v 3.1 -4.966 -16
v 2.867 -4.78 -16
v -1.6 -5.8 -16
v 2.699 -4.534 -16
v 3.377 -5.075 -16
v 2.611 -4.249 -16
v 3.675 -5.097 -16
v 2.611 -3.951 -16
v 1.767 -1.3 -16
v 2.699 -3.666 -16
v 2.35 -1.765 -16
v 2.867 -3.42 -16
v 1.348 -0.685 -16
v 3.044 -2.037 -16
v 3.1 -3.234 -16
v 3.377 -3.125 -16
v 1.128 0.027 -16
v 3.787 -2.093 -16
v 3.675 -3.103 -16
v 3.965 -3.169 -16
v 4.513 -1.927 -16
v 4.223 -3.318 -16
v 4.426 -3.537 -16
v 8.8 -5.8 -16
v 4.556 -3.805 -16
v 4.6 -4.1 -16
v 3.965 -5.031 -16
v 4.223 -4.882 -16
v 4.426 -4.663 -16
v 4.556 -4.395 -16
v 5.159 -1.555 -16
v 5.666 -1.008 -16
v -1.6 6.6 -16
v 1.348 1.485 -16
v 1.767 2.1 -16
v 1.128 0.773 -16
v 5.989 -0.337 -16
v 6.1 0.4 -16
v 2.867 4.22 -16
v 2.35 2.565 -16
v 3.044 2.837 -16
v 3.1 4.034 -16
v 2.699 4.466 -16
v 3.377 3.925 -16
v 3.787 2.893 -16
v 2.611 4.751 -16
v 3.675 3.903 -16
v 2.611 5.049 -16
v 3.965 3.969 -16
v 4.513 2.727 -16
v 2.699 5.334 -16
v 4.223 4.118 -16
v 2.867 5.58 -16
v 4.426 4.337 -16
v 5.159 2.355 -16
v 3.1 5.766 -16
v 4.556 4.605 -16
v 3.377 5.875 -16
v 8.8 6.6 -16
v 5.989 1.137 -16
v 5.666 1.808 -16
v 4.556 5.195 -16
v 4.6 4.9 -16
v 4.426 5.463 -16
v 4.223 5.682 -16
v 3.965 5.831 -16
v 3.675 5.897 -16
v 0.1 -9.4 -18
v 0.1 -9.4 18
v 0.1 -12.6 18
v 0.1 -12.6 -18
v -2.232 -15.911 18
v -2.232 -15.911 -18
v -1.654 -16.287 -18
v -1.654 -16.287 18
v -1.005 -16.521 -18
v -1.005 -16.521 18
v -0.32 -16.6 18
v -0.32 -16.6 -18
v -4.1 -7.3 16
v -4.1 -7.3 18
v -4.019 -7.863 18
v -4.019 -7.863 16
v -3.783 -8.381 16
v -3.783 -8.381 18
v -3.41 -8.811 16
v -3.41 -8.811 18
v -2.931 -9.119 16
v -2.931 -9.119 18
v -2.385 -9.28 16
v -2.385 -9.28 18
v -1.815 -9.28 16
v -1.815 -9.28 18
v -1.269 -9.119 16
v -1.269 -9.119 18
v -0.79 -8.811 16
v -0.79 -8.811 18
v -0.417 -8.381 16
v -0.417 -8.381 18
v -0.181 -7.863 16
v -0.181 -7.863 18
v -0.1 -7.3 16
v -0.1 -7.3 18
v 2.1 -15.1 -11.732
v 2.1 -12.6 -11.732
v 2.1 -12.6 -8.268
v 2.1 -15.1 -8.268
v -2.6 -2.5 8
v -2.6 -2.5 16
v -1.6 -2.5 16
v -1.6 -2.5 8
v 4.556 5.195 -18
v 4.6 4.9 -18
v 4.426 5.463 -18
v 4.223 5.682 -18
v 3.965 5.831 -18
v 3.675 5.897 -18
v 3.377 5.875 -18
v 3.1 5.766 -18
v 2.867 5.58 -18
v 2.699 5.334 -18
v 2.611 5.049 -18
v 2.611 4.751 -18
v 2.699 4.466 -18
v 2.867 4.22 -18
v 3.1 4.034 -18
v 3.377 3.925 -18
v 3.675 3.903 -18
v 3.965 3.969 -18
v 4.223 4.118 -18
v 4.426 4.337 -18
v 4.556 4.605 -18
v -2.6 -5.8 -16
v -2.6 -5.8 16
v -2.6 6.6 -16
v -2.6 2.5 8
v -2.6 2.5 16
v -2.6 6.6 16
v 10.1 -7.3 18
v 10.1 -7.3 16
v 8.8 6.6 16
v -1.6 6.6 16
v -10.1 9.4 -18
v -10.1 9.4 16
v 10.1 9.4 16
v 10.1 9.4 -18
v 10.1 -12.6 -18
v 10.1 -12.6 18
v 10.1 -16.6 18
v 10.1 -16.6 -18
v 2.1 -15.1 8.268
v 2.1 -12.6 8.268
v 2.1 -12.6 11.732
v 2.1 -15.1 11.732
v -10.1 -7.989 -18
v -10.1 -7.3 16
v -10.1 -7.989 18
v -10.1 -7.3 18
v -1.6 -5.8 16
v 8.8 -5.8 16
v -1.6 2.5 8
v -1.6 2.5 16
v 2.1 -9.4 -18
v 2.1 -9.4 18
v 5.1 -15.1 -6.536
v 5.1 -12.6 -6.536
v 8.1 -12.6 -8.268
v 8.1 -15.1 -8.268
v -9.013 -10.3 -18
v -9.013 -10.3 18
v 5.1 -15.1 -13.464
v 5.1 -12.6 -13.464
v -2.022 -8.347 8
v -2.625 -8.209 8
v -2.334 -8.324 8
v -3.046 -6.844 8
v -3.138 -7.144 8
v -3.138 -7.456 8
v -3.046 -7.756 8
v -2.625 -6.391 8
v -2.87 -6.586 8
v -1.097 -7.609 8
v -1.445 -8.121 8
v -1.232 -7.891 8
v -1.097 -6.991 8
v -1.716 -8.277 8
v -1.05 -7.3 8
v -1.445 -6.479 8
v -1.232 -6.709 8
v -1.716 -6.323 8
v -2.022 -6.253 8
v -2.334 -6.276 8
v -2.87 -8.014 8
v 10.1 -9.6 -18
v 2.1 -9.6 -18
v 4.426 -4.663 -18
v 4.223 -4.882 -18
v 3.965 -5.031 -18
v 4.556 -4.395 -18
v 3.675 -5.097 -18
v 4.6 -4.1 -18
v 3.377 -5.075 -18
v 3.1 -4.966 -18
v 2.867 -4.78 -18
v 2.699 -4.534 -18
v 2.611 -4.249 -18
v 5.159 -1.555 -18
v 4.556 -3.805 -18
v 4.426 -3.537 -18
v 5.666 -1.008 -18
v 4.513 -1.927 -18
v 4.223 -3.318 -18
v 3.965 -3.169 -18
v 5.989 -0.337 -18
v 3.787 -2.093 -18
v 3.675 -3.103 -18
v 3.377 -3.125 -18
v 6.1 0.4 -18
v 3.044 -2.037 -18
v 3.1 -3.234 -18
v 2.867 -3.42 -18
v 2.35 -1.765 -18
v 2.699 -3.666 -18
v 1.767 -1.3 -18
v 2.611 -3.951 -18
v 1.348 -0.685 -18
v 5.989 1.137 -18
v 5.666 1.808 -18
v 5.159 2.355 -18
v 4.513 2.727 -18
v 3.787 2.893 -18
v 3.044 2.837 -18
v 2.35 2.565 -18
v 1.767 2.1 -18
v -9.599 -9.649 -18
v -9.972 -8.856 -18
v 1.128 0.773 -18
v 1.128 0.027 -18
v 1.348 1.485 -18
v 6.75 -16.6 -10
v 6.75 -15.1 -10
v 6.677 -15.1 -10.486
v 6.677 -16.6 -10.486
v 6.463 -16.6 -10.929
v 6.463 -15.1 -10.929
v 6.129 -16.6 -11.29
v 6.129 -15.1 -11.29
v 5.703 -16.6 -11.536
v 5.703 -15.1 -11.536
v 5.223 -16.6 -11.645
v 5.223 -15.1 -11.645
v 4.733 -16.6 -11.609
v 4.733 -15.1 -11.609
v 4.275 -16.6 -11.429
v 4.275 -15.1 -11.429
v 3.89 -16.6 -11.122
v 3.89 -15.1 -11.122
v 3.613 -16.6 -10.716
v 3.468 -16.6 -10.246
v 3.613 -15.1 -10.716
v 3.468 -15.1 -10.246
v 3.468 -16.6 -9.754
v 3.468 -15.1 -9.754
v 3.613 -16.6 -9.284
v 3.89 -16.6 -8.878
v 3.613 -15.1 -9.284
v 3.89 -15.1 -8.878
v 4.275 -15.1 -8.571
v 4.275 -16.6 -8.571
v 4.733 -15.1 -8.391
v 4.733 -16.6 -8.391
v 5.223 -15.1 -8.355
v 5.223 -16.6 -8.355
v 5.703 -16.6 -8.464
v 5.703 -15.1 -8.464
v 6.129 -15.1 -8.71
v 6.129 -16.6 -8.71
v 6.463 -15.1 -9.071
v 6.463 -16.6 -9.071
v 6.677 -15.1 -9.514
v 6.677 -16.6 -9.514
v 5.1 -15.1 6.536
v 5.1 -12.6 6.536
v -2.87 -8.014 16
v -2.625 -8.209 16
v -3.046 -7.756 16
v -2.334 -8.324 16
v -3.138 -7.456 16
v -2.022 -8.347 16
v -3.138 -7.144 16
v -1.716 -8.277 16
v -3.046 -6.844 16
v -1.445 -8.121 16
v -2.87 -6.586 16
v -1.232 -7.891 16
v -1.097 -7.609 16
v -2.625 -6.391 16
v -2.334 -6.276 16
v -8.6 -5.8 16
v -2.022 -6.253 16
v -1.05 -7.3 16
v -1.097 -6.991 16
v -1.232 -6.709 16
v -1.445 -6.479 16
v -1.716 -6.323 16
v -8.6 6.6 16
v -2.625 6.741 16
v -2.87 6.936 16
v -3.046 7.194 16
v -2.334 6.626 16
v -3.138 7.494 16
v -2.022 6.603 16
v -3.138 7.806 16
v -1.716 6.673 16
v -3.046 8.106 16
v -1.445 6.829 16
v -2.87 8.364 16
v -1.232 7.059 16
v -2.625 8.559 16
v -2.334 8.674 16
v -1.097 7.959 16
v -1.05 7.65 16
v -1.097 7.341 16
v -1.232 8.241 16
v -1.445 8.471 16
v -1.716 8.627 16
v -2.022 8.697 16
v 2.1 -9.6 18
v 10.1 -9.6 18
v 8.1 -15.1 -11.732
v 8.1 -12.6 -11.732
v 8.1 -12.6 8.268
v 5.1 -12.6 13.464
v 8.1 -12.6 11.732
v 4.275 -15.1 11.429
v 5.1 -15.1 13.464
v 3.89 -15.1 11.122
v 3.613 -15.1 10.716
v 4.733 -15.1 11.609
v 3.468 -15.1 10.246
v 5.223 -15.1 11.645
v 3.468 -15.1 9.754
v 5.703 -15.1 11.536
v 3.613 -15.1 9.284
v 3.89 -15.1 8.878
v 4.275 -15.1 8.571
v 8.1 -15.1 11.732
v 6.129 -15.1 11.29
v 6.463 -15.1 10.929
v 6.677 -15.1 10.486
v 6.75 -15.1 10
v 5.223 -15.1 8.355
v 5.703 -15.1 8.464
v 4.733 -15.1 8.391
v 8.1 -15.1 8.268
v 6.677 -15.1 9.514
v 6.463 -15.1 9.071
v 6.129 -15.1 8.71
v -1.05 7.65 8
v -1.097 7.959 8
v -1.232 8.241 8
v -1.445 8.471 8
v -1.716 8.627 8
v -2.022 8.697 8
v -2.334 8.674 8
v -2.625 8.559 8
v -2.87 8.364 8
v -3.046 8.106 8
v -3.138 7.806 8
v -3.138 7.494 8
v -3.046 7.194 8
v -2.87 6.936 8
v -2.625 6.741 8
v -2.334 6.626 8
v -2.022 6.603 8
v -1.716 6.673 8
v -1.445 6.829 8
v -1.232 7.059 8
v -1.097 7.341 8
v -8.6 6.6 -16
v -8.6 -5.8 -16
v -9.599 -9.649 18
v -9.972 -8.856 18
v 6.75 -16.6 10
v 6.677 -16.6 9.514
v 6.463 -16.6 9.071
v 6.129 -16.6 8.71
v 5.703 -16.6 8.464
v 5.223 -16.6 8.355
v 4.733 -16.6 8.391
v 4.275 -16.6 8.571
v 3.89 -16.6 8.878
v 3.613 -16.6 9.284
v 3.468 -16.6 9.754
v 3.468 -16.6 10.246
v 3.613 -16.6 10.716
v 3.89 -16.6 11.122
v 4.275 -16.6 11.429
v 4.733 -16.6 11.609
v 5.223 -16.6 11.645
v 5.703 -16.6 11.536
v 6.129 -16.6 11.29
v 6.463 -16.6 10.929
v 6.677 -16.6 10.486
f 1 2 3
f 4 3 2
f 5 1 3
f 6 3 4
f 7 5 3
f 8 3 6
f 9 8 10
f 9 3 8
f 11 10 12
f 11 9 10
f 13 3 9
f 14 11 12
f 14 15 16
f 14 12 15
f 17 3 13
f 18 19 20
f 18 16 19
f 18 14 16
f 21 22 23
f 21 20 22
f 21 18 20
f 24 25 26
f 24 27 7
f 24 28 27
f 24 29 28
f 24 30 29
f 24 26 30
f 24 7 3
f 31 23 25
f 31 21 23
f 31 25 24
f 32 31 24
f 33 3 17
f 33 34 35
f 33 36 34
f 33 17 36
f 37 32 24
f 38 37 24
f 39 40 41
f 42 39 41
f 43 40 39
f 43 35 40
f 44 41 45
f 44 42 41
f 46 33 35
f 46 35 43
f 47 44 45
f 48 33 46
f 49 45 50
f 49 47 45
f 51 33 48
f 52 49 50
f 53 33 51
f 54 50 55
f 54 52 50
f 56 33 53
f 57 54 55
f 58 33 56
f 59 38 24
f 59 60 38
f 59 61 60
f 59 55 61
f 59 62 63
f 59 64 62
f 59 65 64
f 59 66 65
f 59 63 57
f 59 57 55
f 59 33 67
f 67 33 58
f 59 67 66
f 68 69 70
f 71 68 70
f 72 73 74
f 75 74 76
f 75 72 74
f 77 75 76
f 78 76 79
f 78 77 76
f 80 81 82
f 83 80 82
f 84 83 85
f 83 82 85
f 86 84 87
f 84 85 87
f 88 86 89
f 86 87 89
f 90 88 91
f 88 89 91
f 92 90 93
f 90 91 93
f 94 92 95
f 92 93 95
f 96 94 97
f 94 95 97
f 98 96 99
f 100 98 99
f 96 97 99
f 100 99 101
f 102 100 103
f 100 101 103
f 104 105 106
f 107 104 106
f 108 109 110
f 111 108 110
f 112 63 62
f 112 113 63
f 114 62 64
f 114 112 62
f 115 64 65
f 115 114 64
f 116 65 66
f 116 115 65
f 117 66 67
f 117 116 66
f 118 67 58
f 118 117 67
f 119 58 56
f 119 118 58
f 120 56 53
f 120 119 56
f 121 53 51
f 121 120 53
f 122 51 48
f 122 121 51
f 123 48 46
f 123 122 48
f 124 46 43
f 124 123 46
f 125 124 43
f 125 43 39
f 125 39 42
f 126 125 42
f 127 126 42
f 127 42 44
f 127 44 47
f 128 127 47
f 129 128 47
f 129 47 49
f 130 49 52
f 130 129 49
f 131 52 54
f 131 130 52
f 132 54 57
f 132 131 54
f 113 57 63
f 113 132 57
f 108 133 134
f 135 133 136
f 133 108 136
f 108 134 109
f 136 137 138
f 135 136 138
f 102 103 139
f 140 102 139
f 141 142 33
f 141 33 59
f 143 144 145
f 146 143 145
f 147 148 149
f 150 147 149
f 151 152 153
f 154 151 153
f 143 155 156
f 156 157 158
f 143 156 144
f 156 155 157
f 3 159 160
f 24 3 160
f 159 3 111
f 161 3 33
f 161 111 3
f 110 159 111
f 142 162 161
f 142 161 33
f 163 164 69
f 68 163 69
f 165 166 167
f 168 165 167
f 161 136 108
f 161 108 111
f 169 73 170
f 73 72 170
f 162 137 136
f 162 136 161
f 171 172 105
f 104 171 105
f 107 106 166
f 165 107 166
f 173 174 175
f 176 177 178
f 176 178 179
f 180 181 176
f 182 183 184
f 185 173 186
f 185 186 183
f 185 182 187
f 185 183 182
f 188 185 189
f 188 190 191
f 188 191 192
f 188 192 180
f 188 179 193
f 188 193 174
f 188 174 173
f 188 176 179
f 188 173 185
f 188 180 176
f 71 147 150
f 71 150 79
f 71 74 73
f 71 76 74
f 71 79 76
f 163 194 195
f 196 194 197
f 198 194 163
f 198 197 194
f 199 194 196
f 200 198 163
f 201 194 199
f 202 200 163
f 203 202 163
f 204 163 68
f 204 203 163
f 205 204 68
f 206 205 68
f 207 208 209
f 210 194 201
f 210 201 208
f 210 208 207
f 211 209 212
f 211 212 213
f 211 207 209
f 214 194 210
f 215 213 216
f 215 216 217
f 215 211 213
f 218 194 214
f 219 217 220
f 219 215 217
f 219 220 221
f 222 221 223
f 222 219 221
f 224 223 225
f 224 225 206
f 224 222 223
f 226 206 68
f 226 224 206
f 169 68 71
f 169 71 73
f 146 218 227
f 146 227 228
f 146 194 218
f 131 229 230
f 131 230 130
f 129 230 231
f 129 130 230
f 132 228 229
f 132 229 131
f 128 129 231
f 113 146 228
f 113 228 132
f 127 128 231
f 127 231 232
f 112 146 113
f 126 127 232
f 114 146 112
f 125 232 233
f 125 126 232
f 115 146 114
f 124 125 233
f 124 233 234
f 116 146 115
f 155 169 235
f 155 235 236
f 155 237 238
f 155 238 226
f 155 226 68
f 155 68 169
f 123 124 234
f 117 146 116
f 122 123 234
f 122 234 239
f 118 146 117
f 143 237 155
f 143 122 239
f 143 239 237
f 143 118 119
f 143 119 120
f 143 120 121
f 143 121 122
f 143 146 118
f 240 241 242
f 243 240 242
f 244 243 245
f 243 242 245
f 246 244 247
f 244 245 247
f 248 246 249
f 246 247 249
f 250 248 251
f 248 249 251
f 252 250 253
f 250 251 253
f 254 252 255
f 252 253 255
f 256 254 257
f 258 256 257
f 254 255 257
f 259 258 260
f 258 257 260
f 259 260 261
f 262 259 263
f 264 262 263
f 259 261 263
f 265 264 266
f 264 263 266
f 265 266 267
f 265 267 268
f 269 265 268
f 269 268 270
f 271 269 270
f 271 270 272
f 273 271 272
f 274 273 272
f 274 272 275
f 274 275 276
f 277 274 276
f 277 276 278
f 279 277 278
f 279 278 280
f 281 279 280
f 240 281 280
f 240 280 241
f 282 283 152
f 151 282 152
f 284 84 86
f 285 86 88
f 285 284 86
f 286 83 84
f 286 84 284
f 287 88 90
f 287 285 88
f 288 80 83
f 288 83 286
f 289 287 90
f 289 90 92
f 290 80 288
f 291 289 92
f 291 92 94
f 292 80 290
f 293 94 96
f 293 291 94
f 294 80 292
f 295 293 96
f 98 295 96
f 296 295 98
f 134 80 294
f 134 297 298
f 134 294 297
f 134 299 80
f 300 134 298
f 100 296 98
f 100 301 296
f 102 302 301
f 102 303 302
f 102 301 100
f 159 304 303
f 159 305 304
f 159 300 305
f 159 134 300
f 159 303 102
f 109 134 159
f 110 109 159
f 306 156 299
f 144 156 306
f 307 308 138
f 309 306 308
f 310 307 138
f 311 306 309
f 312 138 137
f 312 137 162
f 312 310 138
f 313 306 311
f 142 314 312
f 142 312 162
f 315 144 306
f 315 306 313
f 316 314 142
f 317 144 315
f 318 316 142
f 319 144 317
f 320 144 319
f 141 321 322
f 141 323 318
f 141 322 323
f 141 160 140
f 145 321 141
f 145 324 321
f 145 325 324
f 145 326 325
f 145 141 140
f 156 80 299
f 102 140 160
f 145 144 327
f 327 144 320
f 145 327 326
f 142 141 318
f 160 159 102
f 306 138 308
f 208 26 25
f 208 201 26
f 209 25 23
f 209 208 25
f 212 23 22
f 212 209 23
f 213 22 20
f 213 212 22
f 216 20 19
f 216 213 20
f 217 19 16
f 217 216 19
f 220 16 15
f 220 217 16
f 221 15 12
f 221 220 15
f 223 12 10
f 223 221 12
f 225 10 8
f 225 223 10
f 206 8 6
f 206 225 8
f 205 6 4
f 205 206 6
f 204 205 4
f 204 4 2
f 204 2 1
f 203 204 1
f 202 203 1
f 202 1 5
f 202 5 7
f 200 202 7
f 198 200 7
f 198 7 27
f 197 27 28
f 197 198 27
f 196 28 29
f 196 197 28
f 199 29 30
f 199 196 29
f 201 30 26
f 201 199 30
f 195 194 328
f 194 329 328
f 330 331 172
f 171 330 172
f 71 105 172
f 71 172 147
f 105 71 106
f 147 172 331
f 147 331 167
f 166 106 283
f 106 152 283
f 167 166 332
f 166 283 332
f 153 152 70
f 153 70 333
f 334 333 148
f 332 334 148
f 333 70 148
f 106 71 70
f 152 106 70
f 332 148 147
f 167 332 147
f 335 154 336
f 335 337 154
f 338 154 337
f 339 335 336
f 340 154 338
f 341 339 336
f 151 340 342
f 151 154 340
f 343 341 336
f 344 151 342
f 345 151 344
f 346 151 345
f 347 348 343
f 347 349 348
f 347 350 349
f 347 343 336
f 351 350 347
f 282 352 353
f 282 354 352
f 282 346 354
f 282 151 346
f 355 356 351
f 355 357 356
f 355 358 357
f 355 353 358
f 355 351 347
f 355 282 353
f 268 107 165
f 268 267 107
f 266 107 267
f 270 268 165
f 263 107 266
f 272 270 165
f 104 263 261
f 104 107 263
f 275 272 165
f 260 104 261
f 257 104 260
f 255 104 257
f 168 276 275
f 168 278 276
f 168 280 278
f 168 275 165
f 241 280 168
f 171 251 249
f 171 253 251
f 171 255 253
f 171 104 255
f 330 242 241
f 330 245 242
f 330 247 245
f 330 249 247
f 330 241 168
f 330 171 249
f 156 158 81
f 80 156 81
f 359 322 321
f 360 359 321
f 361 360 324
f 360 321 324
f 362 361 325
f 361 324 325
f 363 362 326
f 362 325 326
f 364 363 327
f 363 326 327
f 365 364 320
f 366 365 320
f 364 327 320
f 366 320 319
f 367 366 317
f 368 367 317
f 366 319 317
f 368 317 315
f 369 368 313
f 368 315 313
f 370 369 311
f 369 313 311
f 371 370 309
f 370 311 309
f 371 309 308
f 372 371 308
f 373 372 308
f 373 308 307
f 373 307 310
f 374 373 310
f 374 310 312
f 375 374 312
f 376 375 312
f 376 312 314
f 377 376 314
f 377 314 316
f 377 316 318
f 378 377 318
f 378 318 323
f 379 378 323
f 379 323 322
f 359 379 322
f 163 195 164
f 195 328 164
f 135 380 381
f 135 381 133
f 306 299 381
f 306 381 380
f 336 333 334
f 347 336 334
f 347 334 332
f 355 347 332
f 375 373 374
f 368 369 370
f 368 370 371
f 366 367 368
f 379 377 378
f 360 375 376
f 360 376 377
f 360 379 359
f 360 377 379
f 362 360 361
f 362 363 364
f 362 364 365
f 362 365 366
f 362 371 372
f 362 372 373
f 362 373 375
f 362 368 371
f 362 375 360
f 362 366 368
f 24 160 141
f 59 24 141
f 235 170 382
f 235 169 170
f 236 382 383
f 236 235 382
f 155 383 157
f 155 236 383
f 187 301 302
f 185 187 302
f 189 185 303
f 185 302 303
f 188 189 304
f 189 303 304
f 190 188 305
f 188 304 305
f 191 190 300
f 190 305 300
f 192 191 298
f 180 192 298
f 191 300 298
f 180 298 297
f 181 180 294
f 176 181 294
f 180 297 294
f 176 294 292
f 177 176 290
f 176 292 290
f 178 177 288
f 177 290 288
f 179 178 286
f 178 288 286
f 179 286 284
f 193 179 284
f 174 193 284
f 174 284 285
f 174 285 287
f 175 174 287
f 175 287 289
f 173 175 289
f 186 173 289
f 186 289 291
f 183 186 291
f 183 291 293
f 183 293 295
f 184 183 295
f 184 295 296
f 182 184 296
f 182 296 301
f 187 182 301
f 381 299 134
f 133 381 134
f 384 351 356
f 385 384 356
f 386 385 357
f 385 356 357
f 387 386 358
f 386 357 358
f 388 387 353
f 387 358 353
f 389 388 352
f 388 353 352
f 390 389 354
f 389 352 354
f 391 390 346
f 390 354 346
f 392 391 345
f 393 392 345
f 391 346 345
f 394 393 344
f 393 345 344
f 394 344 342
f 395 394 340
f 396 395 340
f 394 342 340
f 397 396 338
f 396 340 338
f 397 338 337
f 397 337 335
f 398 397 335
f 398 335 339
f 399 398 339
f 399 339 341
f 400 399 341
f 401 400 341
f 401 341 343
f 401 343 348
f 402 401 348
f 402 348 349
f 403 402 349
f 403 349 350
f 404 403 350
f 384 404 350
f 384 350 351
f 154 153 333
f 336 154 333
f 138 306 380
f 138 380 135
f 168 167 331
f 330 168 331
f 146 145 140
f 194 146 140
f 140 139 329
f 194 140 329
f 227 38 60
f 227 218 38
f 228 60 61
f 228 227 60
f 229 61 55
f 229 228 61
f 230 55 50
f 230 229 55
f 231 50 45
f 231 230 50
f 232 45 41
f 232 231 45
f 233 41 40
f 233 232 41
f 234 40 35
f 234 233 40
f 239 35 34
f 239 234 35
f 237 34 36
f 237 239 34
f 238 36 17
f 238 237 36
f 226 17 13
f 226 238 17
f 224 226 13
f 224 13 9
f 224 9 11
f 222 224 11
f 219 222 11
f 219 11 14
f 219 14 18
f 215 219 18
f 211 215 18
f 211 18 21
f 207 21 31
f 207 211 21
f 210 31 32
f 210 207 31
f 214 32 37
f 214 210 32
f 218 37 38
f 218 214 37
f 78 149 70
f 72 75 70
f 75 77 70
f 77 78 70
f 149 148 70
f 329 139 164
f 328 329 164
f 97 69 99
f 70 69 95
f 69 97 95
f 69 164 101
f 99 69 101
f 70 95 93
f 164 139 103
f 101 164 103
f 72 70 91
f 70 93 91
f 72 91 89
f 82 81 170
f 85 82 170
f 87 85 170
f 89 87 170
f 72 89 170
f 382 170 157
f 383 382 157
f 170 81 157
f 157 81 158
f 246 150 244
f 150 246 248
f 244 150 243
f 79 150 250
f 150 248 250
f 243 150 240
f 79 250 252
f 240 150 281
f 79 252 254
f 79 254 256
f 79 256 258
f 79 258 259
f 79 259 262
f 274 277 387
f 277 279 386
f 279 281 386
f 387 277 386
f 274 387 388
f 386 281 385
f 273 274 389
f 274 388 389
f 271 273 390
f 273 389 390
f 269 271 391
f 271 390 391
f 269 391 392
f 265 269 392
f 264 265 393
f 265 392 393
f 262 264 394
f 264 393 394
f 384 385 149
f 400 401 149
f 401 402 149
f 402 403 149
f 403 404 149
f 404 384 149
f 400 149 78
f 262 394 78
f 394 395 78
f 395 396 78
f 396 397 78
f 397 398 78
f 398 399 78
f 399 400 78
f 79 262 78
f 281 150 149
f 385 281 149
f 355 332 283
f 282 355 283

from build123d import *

# Parameters (mm, degrees)
ESBO_O1_W                = 6
ESBO_O1_H                = 12.4
ESBO_O1_W_2              = 10.4
ESBO_O1_R                = 1
ESBO_O1_R_2              = 2.5
RESSALTO_EXTRUS_O1_DEPTH = 18
CORTE_EXTRUS_O5_START    = 18
ESBO_O1_3_W              = 6
ESBO_O1_3_H              = 12.4
ESBO_O1_3_W_2            = 10.4
ESBO_O1_3_R              = 1
ESBO_O1_3_R_2            = 2.5
CORTE_EXTRUS_O5_DEPTH    = 34
ESBO_O3_R                = 1.05
ESBO_O3_W                = 1
ESBO_O3_H                = 5
CORTE_EXTRUS_O3_DEPTH    = 10
CORTE_EXTRUS_O4_DEPTH    = 2
ESBO_O5_R                = 1.65
CORTE_EXTRUS_O6_DEPTH    = 2.5
ESBO_O5_2_R              = 1.65
CORTE_EXTRUS_O7_DEPTH    = 5
FILETE1_R                = 3


with BuildPart() as part:
    # Esboço1 → Ressalto-extrusão1 (new body, symmetric)
    with BuildSketch(Plane.XY):
        Polygon((-1.4, -16.6), (-10.1, -9.4), (-10.1, 9.4), (10.1, 9.4), (10.1, -9.6), (2.1, -9.6), (2.1, -9.4), (0.1, -9.4), (0.1, -12.6), (10.1, -12.6), (10.1, -16.6), align=None)
        with Locations((-5.6, 0.4)):
            Rectangle(ESBO_O1_W, ESBO_O1_H, mode=Mode.SUBTRACT)
        with Locations((3.6, 0.4)):
            Rectangle(ESBO_O1_W_2, ESBO_O1_H, mode=Mode.SUBTRACT)
        with Locations((-5.6, 0.4)):
            Rectangle(ESBO_O1_W, ESBO_O1_H)
        with Locations((3.6, 0.4)):
            Rectangle(ESBO_O1_W_2, ESBO_O1_H)
        with Locations((3.6, 4.9)):
            Circle(ESBO_O1_R, mode=Mode.SUBTRACT)
        with Locations((3.6, -4.1)):
            Circle(ESBO_O1_R, mode=Mode.SUBTRACT)
        with Locations((3.6, 0.4)):
            Circle(ESBO_O1_R_2, mode=Mode.SUBTRACT)
    extrude(amount=RESSALTO_EXTRUS_O1_DEPTH, both=True)

    # Esboço1<3> → Corte-extrusão5 (cut)
    with BuildSketch(Plane.XY.offset(CORTE_EXTRUS_O5_START)):
        with Locations((-5.6, 0.4)):
            Rectangle(ESBO_O1_3_W, ESBO_O1_3_H)
        with Locations((3.6, 0.4)):
            Rectangle(ESBO_O1_3_W_2, ESBO_O1_3_H)
        with Locations((3.6, 4.9)):
            Circle(ESBO_O1_3_R, mode=Mode.SUBTRACT)
        with Locations((3.6, -4.1)):
            Circle(ESBO_O1_3_R, mode=Mode.SUBTRACT)
        with Locations((3.6, 0.4)):
            Circle(ESBO_O1_3_R_2, mode=Mode.SUBTRACT)
    extrude(amount=-CORTE_EXTRUS_O5_DEPTH, mode=Mode.SUBTRACT)

    # Esboço3 → Corte-extrusão3 (cut)
    with BuildSketch(Plane.XY.offset(18)):
        with Locations((-2.1, 7.65)):
            Circle(ESBO_O3_R)
        with Locations((-2.1, -7.3)):
            Circle(ESBO_O3_R)
        with Locations((-2.1, 0)):
            Rectangle(ESBO_O3_W, ESBO_O3_H)
    extrude(amount=-CORTE_EXTRUS_O3_DEPTH, mode=Mode.SUBTRACT)

    # Esboço4 → Corte-extrusão4 (cut)
    with BuildSketch(Plane.XY.offset(18)):
        with BuildLine():
            Line((-10.1, 9.4), (-10.1, -7.3))
            Line((-10.1, -7.3), (-4.1, -7.3))
            ThreePointArc((-4.1, -7.3), (-2.1, -9.3), (-0.1, -7.3))
            Line((-0.1, -7.3), (10.1, -7.3))
            Line((10.1, -7.3), (10.1, 9.4))
            Line((10.1, 9.4), (-10.1, 9.4))
        make_face()
    extrude(amount=-CORTE_EXTRUS_O4_DEPTH, mode=Mode.SUBTRACT)

    # Esboço5 → Corte-extrusão6 (cut)
    with BuildSketch(Plane(origin=(0, -12.6, 0), x_dir=(1, 0, 0), z_dir=(0, 1, 0))):
        Polygon((5.1, 6.535898385), (8.1, 8.267949192), (8.1, 11.732050808), (5.1, 13.464101615), (2.1, 11.732050808), (2.1, 8.267949192), align=None)
        with Locations((5.1, 10)):
            Circle(ESBO_O5_R, mode=Mode.SUBTRACT)
        Polygon((5.1, -13.464101615), (8.1, -11.732050808), (8.1, -8.267949192), (5.1, -6.535898385), (2.1, -8.267949192), (2.1, -11.732050808), align=None)
        with Locations((5.1, -10)):
            Circle(ESBO_O5_R, mode=Mode.SUBTRACT)
    extrude(amount=-CORTE_EXTRUS_O6_DEPTH, mode=Mode.SUBTRACT)

    # Esboço5<2> → Corte-extrusão7 (cut, through all)
    with BuildSketch(Plane(origin=(0, -12.6, 0), x_dir=(1, 0, 0), z_dir=(0, 1, 0))):
        with Locations((5.1, -10)):
            Circle(ESBO_O5_2_R)
        with Locations((5.1, 10)):
            Circle(ESBO_O5_2_R)
    extrude(amount=-CORTE_EXTRUS_O7_DEPTH, mode=Mode.SUBTRACT)

    # Filete1
    filete1_edges = [part.edges().sort_by_distance(p)[0] for p in [
        (-10.1, -9.4, 0),
        (-1.4, -16.6, 0),
    ]]
    fillet(filete1_edges, radius=FILETE1_R)


solid = part.part
